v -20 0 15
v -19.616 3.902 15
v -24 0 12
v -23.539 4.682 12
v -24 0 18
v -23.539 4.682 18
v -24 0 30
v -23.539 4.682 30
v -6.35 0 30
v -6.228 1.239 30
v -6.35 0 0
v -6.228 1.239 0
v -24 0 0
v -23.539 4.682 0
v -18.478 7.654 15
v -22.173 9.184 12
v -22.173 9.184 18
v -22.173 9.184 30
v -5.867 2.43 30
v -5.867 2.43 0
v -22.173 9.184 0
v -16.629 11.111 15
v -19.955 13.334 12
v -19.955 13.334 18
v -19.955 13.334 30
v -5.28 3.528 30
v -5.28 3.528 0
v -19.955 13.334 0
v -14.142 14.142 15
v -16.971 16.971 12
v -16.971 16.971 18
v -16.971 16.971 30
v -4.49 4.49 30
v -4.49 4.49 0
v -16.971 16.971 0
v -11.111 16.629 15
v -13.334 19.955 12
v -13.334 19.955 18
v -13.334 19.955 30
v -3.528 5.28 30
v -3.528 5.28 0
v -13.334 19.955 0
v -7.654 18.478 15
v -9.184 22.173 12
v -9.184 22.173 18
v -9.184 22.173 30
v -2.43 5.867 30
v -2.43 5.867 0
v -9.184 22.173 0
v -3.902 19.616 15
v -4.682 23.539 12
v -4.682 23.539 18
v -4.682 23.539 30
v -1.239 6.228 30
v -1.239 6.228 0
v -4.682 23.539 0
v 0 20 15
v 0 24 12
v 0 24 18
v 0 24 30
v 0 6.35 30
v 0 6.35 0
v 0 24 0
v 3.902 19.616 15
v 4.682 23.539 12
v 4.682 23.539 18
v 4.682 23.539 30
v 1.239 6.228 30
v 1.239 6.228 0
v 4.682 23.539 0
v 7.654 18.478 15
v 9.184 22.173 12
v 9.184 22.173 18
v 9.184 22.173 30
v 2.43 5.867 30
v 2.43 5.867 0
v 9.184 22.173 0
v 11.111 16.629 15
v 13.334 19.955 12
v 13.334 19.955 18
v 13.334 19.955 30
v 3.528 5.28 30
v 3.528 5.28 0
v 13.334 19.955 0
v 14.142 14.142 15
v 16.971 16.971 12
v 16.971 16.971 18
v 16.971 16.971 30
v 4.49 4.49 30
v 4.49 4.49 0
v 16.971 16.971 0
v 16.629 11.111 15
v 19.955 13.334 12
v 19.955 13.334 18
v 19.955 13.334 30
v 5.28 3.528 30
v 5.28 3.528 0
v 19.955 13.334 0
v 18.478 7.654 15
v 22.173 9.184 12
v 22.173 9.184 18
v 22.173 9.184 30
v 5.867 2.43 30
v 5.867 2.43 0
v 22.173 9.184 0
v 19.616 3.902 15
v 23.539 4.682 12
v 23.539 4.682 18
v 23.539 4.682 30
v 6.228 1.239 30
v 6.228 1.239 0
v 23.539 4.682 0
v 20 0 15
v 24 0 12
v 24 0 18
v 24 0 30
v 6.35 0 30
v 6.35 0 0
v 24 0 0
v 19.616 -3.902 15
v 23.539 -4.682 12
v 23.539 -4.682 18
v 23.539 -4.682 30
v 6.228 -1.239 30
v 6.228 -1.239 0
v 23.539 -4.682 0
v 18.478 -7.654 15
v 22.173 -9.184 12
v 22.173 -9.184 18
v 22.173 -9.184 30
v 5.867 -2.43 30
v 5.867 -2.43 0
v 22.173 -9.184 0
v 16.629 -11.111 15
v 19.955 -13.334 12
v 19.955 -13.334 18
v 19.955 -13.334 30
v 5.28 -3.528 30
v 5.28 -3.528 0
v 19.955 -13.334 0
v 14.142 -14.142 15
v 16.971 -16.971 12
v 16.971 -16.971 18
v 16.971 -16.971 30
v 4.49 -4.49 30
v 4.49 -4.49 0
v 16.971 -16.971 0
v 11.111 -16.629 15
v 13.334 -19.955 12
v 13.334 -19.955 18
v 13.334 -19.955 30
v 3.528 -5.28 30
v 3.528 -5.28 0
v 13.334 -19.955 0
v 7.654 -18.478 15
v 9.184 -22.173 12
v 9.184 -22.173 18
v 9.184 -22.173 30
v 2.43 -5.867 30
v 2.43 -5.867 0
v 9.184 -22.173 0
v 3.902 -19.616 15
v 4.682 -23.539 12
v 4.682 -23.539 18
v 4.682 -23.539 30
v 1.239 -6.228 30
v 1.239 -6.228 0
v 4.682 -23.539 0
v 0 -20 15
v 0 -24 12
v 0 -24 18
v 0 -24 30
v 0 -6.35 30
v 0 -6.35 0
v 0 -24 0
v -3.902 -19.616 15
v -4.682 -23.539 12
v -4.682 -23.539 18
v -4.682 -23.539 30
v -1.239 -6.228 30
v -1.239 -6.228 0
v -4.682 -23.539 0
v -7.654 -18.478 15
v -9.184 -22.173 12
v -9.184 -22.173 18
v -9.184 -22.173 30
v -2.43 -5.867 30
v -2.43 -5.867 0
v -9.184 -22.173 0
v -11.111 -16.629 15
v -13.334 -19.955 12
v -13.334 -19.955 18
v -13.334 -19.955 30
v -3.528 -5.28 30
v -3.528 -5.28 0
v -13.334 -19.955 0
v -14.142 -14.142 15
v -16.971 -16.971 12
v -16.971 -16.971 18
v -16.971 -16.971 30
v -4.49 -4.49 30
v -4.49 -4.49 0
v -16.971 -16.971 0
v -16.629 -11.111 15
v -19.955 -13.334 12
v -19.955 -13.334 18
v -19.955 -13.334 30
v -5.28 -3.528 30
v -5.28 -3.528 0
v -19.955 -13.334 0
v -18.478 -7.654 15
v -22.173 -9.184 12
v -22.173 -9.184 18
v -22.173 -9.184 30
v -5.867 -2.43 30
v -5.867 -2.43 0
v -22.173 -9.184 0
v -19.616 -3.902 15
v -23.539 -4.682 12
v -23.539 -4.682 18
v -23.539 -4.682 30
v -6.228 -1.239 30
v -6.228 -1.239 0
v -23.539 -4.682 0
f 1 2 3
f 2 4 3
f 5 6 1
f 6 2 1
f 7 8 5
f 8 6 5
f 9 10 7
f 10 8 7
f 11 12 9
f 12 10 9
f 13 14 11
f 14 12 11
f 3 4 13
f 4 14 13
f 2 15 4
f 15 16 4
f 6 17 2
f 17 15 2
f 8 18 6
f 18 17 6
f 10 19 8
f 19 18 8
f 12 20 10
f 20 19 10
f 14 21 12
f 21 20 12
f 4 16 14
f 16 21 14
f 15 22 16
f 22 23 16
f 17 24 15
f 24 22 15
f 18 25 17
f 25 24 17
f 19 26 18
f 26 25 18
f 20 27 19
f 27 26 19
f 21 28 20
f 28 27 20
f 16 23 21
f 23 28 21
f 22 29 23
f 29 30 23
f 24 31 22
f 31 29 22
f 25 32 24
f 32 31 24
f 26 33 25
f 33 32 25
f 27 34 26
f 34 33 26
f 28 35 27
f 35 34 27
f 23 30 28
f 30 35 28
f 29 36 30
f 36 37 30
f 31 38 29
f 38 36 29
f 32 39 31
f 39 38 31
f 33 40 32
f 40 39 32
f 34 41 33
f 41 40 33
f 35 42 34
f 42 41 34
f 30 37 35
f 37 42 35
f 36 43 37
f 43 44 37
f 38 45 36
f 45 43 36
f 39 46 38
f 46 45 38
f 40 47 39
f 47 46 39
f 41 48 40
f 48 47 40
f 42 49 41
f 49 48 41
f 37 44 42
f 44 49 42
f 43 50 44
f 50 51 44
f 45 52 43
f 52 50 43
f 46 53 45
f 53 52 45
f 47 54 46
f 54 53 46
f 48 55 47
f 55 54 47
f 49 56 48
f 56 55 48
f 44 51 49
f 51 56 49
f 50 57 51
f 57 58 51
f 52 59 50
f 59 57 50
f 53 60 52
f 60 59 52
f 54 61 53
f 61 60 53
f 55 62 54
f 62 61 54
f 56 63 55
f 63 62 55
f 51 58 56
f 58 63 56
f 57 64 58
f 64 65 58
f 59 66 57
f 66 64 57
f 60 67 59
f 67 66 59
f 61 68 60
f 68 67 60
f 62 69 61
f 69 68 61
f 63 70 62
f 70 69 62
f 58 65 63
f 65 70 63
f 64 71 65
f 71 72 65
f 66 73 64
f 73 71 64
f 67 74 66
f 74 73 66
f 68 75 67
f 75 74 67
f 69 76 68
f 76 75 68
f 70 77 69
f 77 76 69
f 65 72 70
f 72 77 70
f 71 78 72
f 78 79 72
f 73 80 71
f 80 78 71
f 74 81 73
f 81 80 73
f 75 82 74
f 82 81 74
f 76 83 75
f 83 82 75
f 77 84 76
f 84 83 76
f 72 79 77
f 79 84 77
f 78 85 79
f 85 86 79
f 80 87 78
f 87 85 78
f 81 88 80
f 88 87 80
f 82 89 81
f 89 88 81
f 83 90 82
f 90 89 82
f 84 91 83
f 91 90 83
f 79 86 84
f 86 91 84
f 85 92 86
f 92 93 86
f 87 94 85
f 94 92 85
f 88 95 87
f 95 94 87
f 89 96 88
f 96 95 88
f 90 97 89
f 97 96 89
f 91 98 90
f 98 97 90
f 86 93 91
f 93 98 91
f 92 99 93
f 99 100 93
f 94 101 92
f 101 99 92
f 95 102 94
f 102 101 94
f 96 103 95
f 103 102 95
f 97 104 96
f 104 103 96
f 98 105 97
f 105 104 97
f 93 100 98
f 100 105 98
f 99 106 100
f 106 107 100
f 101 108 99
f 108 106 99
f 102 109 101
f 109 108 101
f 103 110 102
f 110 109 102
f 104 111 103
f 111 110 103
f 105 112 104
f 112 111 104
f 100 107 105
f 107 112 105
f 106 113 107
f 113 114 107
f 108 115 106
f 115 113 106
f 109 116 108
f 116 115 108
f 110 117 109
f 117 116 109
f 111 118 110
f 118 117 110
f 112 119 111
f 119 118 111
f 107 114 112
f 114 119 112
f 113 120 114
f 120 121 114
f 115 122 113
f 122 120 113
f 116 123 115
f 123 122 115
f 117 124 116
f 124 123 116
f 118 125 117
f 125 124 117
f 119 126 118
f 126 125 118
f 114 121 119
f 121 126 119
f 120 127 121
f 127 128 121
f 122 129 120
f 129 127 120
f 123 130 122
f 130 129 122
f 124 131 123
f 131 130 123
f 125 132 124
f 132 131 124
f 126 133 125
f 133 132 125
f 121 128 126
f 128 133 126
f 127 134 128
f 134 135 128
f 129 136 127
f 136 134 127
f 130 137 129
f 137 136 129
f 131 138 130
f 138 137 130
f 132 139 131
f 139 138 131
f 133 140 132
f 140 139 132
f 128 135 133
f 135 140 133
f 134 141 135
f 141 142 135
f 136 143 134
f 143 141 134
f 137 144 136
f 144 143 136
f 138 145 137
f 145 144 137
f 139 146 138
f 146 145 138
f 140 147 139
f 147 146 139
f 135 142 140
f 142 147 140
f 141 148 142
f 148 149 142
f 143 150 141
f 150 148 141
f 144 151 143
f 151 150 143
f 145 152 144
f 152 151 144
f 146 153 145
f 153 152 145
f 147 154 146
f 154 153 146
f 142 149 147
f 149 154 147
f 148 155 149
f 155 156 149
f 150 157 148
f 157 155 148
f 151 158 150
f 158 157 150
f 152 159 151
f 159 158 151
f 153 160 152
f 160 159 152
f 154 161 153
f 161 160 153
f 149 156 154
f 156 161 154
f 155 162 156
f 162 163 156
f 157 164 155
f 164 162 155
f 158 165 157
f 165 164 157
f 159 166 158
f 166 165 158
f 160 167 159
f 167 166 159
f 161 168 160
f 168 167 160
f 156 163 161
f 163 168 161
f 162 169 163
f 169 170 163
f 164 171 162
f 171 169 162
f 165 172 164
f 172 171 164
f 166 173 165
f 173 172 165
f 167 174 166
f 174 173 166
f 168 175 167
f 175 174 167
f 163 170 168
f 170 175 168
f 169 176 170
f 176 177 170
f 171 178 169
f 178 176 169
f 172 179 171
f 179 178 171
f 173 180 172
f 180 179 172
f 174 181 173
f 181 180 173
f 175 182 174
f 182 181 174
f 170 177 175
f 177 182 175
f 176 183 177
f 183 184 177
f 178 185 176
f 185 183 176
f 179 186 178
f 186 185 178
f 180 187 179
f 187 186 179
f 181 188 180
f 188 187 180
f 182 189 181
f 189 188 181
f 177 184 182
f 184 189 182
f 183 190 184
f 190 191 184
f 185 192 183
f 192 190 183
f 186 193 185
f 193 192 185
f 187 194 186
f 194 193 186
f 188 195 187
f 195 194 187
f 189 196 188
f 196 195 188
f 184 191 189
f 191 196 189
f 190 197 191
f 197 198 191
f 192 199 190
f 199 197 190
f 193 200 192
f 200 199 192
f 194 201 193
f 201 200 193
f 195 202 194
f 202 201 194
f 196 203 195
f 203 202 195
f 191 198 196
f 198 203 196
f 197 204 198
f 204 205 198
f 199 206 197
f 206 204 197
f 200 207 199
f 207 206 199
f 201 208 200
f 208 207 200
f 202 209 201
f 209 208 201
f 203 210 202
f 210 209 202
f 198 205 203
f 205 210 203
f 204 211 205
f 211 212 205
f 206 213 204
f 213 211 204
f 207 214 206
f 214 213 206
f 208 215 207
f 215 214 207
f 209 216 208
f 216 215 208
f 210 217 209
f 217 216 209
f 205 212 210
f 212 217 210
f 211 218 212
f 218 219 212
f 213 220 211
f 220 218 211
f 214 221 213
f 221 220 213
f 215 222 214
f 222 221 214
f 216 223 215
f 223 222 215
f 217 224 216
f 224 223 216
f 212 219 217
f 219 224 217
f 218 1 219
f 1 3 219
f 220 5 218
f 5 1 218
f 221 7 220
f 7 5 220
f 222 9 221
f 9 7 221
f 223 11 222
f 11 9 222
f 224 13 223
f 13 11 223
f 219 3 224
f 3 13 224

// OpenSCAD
$fn = 32;

// ----------------------------------------------------------------------
// Belt roller: 48 mm barrel, 30 mm wide, bore 12.7 mm
// ----------------------------------------------------------------------

// --- parameters (mm) ---
bore_d = 12.7;            // bore
barrel_d = 48;            // barrel diameter
roller_w = 30;            // roller width
groove_w = 6;             // guide groove width
groove_d = 4;             // guide groove depth

roller_profile = [[6.35, 0], [24, 0], [24, 12], [20, 15], [24, 18], [24, 30], [6.35, 30]];

/* the profile stays clear of the axis, so the bore comes out of the revolve */
rotate_extrude() polygon(roller_profile);
